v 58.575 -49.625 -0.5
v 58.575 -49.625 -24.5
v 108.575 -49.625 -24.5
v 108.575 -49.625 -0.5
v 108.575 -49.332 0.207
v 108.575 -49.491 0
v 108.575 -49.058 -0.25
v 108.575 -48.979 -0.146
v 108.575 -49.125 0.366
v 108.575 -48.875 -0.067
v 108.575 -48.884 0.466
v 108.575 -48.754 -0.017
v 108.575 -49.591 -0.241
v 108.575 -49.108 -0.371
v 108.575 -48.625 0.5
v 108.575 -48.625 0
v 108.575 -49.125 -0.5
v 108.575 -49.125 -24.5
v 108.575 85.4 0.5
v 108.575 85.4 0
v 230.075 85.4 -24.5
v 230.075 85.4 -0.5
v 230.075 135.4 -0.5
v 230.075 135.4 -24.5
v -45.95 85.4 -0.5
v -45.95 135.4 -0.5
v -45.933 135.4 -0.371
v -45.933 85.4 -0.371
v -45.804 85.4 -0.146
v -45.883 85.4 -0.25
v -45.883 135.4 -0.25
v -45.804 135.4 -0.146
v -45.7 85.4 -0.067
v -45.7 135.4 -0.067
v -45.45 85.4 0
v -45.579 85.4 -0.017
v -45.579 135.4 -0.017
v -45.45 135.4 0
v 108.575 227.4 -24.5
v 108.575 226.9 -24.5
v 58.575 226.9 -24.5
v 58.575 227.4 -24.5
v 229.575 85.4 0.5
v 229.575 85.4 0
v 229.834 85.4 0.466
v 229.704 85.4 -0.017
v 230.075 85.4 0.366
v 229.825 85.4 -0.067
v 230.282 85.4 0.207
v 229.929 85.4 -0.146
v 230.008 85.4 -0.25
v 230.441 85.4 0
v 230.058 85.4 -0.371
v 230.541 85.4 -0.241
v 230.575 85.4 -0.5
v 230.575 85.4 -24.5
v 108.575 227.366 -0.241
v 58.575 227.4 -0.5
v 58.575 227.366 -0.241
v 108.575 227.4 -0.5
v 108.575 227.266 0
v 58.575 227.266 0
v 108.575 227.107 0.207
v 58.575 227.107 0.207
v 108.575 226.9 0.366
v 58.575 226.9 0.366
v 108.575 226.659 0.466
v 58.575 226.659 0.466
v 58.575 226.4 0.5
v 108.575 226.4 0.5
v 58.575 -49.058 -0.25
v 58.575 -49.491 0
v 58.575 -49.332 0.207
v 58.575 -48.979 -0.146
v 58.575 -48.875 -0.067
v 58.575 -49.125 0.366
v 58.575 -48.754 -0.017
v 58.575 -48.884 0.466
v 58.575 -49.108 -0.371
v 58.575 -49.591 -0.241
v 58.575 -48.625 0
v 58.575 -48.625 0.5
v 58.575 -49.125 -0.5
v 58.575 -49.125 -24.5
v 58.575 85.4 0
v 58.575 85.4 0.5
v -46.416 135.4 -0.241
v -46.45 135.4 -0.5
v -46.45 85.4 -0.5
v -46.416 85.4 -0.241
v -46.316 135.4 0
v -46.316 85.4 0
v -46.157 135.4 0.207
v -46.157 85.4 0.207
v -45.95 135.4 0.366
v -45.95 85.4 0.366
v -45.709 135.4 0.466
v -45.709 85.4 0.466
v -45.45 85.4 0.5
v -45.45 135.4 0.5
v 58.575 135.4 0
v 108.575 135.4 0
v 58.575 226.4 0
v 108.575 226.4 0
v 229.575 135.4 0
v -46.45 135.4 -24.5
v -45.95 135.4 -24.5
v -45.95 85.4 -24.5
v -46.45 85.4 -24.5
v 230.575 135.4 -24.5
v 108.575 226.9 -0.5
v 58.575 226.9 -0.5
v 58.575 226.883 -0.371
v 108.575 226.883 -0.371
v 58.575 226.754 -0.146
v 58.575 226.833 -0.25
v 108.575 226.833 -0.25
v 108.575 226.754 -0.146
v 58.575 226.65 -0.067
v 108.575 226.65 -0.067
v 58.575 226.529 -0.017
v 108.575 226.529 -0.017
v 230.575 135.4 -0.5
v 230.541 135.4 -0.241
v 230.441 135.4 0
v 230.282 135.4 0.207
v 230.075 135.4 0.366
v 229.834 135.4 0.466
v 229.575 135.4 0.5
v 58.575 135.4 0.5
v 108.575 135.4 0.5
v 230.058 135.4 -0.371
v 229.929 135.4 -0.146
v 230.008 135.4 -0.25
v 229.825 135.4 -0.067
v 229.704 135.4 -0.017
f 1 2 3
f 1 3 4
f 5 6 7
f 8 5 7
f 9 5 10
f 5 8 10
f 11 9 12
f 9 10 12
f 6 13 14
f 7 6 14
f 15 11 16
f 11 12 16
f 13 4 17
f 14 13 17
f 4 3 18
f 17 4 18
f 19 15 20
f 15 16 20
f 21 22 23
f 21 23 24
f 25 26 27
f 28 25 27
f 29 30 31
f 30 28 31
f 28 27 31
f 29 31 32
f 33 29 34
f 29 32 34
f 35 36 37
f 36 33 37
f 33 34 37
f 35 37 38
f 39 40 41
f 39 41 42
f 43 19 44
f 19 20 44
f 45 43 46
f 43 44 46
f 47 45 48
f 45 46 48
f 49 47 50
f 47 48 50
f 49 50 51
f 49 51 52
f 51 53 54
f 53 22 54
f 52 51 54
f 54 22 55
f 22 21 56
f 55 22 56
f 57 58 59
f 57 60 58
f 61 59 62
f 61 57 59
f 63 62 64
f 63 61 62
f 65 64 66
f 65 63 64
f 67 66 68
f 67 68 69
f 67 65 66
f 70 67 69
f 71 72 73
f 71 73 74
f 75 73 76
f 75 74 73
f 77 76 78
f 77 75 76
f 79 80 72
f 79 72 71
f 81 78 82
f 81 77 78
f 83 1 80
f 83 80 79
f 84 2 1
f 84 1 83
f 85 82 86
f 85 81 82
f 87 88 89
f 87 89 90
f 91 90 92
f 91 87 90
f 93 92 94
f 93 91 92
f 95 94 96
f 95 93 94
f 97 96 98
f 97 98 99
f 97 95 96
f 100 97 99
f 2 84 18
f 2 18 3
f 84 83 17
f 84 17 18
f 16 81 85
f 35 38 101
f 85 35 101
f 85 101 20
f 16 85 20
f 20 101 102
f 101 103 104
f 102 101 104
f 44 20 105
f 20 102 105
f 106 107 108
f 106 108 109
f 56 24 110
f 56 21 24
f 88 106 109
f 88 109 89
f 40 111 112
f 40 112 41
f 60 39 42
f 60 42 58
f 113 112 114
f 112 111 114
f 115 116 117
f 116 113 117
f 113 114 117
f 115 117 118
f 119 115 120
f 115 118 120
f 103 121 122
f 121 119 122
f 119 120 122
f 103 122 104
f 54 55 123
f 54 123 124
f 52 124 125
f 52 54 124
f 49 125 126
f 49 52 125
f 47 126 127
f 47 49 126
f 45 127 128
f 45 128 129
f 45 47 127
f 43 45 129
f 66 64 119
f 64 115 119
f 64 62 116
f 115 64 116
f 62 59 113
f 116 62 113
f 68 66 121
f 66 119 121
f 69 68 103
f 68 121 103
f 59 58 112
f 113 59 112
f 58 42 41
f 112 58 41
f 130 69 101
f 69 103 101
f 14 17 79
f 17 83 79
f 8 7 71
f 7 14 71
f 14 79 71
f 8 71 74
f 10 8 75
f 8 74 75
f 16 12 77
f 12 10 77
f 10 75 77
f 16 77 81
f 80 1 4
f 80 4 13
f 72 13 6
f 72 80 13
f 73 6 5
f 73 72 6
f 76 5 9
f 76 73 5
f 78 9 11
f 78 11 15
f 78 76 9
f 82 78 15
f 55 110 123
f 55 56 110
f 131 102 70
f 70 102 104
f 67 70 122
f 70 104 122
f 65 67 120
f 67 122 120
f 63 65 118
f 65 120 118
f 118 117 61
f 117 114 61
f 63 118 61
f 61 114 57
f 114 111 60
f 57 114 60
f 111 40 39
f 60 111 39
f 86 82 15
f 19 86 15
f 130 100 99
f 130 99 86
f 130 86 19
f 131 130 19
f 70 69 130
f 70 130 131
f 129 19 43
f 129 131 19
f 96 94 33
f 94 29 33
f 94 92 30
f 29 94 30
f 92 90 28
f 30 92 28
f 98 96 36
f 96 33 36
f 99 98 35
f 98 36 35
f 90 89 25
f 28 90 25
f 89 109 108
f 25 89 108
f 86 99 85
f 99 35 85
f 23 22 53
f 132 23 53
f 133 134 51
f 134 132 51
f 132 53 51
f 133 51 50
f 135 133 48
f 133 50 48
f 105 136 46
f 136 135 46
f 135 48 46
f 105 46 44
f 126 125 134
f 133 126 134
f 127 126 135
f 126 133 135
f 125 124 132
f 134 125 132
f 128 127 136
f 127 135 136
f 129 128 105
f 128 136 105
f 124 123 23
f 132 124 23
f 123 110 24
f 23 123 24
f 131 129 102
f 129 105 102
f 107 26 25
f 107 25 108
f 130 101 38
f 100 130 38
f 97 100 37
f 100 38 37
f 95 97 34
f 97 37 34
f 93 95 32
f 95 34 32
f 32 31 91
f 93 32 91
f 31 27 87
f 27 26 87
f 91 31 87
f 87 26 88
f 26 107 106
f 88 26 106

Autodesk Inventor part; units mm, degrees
ref_plane "YZ Plane" through (0, 0, 0) normal (1, 0, 0) x (0, 1, 0)
ref_plane "XZ Plane" through (0, 0, 0) normal (0, 1, 0) x (-1, 0, 0)
ref_plane "XY Plane" through (0, 0, 0) normal (0, 0, 1) x (1, 0, 0)
ref_plane "Work Plane1" through (0, 0, 0) normal (0, 0, 1) x (1, 0, 0)
sketch "Sketch1" plane through (0, 0, 0) normal (0, 0, 1) x (1, 0, 0)
  line L0 (230.575, 85.4) -> (230.575, 135.4)
  line L1 (-46.45, 135.4) -> (-46.45, 85.4)
  line L2 (58.575, -49.625) -> (108.575, -49.625)
  line L3 (108.575, 227.4) -> (58.575, 227.4)
  line L4 (-622.225, -47.625) -> (228.575, -47.625)
  line L5 (-44.45, 0) -> (-44.45, 225.4)
  line L6 (180.95, 225.4) -> (-44.45, 225.4)
  line L7 (228.575, -47.625) -> (228.575, 1203.175)
  line L8 (-46.45, 85.4) -> (58.575, 85.4)
  line L9 (108.575, 85.4) -> (230.575, 85.4)
  line L10 (108.575, -49.625) -> (108.575, 85.4)
  line L11 (108.575, 135.4) -> (108.575, 227.4)
  line L12 (58.575, 227.4) -> (58.575, 135.4)
  line L13 (58.575, 85.4) -> (58.575, -49.625)
  line L14 (230.575, 135.4) -> (108.575, 135.4)
  line L15 (58.575, 135.4) -> (-46.45, 135.4)
  point P0 (0, 0)
  point P1 (83.575, 227.4)
  point P2 (83.575, -49.625)
  dimension "d16" = 2
  dimension "d17" = 2
  dimension "d18" = 2
  dimension "d19" = 2
  dimension "d20" = 92
  dimension "d21" = 122
  dimension "d22" = 105.025
  dimension "d23" = 135.025
  dimension "d24" = 50
  dimension "d25" = 50
  dimension "d26" = 50
extrude "Plate1" add sketch "Sketch1" along normal blind 0.5 contours L9 L7 L14 L0 | L9 L10 L4 L13 L8 L5 L15 L12 L6 L11 L14 L7 | L10 L2 L13 L4 | L6 L12 L3 L11 | L8 L1 L15 L5
sketch "Sketch3" plane through (108.575, -49.125, 0.5) normal (0, -1, 0) x (1, 0, 0)
  line L0 (-50, 0) -> (0, 0)
  line L1 (0, 0) -> (0, 25)
  line L2 (0, 25) -> (-50, 25)
  line L3 (-50, 25) -> (-50, 0)
edge flange "Flange2" height 25 angle 90 thickness 0.5 bend radius 0.5 thickness toward (0, -1, 0) relief tear relief width 0.5 relief depth 0.25 corner gap 0.5 corner form 0 edges at (83.575, -49.625, 0.5) (230.575, 110.4, 0.5) (83.575, 227.4, 0.5) (-46.45, 110.4, 0.5) wall of the first edge with corners at (58.575, -49.125, 0.5) (108.575, -49.125, 0.5) (108.575, -49.125, -24.5) (58.575, -49.125, -24.5)
bend "Bend2"
corner "Corner2"
equation "\"d4\" = Thickness"
equation "\"d27\" = BendReliefWidth"
equation "\"d28\" = BendReliefDepth"
equation "\"d29\" = MinimumRemnant"
equation "\"d30\" = TransitionRadius"
equation "\"d33\" = BendRadius"
equation "\"d34\" = CornerReliefSize"
equation "\"d35\" = GapSize"
equation "\"d36\" = JacobiRadiusSize"
equation "\"BendRadius\" = Thickness"
equation "\"BendReliefWidth\" = Thickness"
equation "\"BendReliefDepth\" = 0.5 * Thickness"
equation "\"CornerReliefSize\" = 4 * Thickness"
equation "\"MinimumRemnant\" = 2 * Thickness"
equation "\"TransitionRadius\" = BendRadius"
equation "\"JacobiRadiusSize\" = BendRadius"
equation "\"GapSize\" = Thickness"
equation "\"Thickness\" = 0.5"
properties part number "Brush_holder"
